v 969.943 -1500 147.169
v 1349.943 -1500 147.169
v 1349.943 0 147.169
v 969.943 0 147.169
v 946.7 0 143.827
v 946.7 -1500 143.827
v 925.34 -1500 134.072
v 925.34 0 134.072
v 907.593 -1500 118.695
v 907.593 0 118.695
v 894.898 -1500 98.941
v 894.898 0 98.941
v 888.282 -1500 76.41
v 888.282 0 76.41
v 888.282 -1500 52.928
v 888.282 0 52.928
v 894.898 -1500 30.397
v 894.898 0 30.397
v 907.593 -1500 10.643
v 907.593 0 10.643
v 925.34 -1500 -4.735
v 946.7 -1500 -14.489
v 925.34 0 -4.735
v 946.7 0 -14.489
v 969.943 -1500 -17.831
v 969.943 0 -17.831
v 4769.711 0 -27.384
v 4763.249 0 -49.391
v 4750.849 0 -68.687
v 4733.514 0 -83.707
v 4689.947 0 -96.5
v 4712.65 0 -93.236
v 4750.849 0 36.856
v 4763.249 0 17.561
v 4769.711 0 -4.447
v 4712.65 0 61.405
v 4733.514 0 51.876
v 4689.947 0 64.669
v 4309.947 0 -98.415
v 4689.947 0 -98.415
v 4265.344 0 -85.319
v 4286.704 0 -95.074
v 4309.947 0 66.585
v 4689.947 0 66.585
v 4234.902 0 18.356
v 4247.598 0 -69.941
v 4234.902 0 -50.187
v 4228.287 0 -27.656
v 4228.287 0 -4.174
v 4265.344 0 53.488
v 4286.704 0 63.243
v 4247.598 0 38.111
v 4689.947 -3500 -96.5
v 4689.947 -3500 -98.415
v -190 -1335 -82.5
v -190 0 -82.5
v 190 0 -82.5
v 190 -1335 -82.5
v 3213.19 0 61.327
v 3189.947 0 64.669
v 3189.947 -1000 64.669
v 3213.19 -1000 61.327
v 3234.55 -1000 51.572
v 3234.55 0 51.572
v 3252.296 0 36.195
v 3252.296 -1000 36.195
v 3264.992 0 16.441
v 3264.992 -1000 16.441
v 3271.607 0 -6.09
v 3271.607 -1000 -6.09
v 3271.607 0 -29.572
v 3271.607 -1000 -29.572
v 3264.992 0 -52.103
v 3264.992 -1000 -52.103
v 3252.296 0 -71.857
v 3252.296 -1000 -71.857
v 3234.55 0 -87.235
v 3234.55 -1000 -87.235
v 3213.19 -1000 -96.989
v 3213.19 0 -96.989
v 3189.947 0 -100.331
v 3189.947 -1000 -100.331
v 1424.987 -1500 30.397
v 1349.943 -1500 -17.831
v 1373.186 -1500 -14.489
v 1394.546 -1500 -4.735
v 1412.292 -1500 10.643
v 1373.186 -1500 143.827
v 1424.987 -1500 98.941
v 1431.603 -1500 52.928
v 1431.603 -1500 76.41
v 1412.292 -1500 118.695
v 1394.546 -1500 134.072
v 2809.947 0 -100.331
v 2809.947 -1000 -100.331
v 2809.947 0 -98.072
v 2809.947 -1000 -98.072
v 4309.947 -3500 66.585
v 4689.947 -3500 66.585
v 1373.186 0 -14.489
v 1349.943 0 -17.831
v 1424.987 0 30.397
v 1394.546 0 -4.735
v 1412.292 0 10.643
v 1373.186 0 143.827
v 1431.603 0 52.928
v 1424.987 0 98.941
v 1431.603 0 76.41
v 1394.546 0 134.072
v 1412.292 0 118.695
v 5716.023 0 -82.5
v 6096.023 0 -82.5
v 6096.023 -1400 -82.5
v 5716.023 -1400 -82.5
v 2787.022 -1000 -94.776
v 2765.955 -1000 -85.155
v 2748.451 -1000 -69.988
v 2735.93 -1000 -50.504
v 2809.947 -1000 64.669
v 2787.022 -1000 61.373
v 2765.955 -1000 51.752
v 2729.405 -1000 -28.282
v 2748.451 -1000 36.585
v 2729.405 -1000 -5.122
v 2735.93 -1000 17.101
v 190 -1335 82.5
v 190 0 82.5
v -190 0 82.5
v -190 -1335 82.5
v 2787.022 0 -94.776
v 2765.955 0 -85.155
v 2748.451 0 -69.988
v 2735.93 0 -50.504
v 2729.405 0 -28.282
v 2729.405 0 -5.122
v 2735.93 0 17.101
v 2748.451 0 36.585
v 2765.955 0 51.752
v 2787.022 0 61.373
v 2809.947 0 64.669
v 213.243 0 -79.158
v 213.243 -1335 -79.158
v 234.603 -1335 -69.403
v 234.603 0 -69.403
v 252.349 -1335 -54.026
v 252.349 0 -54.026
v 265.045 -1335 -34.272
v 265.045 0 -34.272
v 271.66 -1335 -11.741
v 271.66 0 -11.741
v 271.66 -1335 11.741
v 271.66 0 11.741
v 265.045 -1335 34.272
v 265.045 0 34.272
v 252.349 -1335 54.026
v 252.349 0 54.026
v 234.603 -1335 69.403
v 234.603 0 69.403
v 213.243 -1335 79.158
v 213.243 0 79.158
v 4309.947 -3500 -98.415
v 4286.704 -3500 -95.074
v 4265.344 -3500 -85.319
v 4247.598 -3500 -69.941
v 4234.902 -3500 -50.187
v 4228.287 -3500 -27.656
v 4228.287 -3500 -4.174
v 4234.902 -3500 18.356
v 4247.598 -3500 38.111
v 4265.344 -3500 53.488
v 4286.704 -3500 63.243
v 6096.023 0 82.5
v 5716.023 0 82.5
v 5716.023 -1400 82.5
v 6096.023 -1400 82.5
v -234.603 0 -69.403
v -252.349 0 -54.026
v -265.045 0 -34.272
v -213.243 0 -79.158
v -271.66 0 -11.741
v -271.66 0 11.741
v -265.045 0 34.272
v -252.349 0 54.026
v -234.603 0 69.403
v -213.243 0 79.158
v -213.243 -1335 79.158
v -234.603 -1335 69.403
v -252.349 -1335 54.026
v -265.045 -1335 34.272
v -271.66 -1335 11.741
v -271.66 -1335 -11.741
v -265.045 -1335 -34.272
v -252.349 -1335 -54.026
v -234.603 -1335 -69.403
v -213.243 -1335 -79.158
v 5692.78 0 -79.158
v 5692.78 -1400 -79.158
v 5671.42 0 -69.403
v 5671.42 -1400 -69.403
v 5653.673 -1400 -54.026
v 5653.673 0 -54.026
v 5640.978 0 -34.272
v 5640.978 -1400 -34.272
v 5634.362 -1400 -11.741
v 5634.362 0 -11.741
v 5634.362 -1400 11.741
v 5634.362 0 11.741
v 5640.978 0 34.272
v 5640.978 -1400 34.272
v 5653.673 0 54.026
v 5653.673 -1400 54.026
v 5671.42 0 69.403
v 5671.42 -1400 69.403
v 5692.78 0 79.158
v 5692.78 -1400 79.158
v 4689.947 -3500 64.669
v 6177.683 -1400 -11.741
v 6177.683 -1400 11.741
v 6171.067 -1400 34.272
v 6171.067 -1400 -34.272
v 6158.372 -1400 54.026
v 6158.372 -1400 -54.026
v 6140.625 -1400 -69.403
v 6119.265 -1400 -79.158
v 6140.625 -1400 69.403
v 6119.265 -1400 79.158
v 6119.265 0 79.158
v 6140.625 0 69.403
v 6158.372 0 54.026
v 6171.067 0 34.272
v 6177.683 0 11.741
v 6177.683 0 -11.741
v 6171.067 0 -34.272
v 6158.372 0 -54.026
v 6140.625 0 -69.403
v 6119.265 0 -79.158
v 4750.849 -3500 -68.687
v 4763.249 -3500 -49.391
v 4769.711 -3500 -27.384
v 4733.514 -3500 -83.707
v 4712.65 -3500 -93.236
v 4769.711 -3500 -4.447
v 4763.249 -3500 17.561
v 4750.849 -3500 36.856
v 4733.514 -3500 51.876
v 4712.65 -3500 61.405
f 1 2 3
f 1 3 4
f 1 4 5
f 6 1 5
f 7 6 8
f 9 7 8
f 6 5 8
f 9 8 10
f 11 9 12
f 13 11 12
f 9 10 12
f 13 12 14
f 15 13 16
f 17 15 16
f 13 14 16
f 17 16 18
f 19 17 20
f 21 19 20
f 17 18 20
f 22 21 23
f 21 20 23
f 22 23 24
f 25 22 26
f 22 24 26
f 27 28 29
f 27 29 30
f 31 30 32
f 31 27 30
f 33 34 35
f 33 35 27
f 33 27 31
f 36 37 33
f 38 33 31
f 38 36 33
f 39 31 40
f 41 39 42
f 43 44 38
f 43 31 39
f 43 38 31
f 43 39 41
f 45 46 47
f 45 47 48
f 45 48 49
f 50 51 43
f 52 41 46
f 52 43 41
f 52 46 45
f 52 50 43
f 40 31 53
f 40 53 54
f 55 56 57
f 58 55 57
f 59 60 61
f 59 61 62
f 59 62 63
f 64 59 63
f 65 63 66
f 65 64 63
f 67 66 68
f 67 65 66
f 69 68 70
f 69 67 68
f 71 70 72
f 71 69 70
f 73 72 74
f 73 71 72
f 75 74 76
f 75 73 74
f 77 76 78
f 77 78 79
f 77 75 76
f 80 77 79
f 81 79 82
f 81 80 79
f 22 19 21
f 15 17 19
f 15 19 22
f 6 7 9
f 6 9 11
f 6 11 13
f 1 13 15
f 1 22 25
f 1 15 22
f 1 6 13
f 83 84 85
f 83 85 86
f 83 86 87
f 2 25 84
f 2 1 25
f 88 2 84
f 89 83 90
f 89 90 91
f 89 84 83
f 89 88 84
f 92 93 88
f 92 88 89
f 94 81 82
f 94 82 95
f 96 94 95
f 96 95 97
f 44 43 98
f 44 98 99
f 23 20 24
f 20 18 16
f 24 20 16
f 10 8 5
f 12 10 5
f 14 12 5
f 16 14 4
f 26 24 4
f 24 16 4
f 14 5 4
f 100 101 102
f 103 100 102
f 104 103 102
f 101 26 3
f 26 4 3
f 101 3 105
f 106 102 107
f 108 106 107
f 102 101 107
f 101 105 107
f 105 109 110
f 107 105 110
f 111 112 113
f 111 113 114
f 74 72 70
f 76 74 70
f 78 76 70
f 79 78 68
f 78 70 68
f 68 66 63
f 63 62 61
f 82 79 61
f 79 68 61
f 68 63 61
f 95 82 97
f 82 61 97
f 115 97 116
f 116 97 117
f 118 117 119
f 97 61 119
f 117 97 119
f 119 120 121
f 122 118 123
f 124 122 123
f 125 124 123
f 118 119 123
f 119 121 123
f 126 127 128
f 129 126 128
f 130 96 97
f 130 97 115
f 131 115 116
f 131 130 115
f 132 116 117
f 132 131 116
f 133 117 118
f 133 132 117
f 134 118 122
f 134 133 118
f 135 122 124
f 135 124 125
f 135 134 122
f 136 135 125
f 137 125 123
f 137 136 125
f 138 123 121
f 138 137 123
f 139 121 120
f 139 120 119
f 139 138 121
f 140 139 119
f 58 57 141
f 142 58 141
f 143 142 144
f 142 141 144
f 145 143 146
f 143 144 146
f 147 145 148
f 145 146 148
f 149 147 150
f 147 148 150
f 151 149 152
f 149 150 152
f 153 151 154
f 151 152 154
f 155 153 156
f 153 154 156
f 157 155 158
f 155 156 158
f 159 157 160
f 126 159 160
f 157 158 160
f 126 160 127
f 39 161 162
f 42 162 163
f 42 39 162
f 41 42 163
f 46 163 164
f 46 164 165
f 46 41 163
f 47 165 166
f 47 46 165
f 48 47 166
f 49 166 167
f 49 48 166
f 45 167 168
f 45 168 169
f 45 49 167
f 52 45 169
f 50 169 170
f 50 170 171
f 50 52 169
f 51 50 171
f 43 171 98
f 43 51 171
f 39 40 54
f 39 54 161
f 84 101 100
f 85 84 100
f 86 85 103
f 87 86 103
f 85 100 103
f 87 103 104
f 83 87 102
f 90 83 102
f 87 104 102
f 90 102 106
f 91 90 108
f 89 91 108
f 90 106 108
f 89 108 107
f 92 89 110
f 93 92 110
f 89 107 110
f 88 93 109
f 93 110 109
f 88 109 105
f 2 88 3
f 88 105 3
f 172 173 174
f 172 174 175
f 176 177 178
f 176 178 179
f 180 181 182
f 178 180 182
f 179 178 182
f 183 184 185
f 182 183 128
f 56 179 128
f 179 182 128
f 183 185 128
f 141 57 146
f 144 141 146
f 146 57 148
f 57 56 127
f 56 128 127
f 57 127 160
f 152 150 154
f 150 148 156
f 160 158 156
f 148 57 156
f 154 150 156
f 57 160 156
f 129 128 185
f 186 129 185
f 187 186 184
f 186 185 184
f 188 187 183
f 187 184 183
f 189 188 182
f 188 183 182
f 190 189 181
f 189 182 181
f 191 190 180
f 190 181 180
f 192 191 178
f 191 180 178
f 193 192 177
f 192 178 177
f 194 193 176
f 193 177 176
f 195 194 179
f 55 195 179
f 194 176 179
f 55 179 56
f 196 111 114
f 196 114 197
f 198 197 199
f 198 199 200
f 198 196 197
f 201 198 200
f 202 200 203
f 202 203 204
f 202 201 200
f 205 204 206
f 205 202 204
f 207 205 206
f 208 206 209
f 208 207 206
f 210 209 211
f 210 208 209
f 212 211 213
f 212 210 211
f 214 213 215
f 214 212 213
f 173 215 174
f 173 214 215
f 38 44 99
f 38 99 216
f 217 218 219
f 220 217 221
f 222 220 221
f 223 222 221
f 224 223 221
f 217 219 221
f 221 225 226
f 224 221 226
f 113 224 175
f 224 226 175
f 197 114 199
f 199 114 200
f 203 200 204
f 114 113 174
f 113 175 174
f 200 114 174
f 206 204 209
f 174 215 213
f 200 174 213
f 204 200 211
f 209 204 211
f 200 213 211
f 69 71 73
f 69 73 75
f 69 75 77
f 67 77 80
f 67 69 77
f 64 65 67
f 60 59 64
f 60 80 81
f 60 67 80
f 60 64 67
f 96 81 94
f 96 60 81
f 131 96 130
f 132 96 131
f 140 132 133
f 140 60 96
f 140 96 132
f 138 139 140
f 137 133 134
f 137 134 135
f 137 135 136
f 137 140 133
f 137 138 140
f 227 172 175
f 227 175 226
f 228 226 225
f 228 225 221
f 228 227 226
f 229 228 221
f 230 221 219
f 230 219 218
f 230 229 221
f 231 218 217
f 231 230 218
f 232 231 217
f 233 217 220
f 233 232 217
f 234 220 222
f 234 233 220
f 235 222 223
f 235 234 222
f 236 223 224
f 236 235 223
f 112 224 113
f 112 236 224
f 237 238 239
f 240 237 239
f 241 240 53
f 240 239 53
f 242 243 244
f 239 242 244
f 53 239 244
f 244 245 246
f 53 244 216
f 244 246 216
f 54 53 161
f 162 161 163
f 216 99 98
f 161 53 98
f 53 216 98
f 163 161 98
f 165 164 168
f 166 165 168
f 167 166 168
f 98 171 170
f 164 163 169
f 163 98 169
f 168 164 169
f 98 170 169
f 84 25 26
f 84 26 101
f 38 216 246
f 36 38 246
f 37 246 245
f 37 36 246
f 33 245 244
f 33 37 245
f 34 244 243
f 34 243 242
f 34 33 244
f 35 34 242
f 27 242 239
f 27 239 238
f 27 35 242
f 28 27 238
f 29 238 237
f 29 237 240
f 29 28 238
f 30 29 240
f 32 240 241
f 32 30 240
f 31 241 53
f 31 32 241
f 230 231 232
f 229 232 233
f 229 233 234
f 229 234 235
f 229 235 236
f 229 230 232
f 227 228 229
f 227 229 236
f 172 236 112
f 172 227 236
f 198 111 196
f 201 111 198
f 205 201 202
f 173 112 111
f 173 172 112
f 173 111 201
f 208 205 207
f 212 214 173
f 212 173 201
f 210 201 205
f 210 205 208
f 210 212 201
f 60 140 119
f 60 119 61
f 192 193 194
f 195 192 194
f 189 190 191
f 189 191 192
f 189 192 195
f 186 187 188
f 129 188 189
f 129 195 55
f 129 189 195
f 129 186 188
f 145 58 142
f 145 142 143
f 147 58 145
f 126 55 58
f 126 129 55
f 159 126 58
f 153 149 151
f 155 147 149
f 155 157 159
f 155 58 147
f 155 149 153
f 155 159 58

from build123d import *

# Parameters (mm, degrees)
F1_DEPTH = 1335
F3_DEPTH = 1500
F5_DEPTH = 1000
F7_DEPTH = 3500
F9_DEPTH = 1400


with BuildPart() as f1:
    # F0 (on Front) → F1 (new body)
    with BuildSketch(Plane.XZ):
        with BuildLine():
            Line((-190, -82.5), (190, -82.5))
            ThreePointArc((190, -82.5), (272.5, 0), (190, 82.5))
            Line((190, 82.5), (-190, 82.5))
            ThreePointArc((-190, 82.5), (-272.5, 0), (-190, -82.5))
        make_face()
    extrude(amount=F1_DEPTH)


with BuildPart() as f3:
    # F2 (on Front) → F3 (new body)
    with BuildSketch(Plane.XZ):
        with BuildLine():
            Line((969.942719, -17.831109), (1349.942719, -17.831109))
            ThreePointArc((1349.942719, -17.831109), (1432.442719, 64.668891), (1349.942719, 147.168891))
            Line((1349.942719, 147.168891), (969.942719, 147.168891))
            ThreePointArc((969.942719, 147.168891), (887.442719, 64.668891), (969.942719, -17.831109))
        make_face()
    extrude(amount=F3_DEPTH)


with BuildPart() as f5:
    # F4 (on face) → F5 (new body)
    with BuildSketch(Plane(origin=(0, 0, 0), x_dir=(-1, 0, 0), z_dir=(0, 1, 0))):
        with BuildLine():
            ThreePointArc((-3189.947008, 64.668891), (-3272.447008, -17.831109), (-3189.947008, -100.331109))
            Line((-3189.947008, -100.331109), (-2809.947008, -100.331109))
            Line((-2809.947008, -100.331109), (-2809.947008, -98.072462))
            ThreePointArc((-2809.947008, -98.072462), (-2728.576332, -16.701786), (-2809.947008, 64.668891))
            Line((-2809.947008, 64.668891), (-3189.947008, 64.668891))
        make_face()
    extrude(amount=-F5_DEPTH)


with BuildPart() as f7:
    # F6 (on face) → F7 (new body)
    with BuildSketch(Plane(origin=(0, 0, 0), x_dir=(-1, 0, 0), z_dir=(0, 1, 0))):
        with BuildLine():
            Line((-4689.947008, -96.499764), (-4689.947008, -98.415437))
            Line((-4689.947008, -98.415437), (-4309.947008, -98.415437))
            ThreePointArc((-4309.947008, -98.415437), (-4227.447008, -15.915437), (-4309.947008, 66.584563))
            Line((-4309.947008, 66.584563), (-4689.947008, 66.584563))
            Line((-4689.947008, 66.584563), (-4689.947008, 64.668891))
            ThreePointArc((-4689.947008, 64.668891), (-4770.531335, -15.915437), (-4689.947008, -96.499764))
        make_face()
    extrude(amount=-F7_DEPTH)


with BuildPart() as f9:
    # F8 (on face) → F9 (new body)
    with BuildSketch(Plane(origin=(0, 0, 0), x_dir=(-1, 0, 0), z_dir=(0, 1, 0))):
        with BuildLine():
            ThreePointArc((-6096.022549, 82.5), (-6178.522549, 0), (-6096.022549, -82.5))
            Line((-6096.022549, -82.5), (-5716.022549, -82.5))
            ThreePointArc((-5716.022549, -82.5), (-5633.522549, 0), (-5716.022549, 82.5))
            Line((-5716.022549, 82.5), (-6096.022549, 82.5))
        make_face()
    extrude(amount=-F9_DEPTH)


solid = Compound([f1.part, f3.part, f5.part, f7.part, f9.part])
